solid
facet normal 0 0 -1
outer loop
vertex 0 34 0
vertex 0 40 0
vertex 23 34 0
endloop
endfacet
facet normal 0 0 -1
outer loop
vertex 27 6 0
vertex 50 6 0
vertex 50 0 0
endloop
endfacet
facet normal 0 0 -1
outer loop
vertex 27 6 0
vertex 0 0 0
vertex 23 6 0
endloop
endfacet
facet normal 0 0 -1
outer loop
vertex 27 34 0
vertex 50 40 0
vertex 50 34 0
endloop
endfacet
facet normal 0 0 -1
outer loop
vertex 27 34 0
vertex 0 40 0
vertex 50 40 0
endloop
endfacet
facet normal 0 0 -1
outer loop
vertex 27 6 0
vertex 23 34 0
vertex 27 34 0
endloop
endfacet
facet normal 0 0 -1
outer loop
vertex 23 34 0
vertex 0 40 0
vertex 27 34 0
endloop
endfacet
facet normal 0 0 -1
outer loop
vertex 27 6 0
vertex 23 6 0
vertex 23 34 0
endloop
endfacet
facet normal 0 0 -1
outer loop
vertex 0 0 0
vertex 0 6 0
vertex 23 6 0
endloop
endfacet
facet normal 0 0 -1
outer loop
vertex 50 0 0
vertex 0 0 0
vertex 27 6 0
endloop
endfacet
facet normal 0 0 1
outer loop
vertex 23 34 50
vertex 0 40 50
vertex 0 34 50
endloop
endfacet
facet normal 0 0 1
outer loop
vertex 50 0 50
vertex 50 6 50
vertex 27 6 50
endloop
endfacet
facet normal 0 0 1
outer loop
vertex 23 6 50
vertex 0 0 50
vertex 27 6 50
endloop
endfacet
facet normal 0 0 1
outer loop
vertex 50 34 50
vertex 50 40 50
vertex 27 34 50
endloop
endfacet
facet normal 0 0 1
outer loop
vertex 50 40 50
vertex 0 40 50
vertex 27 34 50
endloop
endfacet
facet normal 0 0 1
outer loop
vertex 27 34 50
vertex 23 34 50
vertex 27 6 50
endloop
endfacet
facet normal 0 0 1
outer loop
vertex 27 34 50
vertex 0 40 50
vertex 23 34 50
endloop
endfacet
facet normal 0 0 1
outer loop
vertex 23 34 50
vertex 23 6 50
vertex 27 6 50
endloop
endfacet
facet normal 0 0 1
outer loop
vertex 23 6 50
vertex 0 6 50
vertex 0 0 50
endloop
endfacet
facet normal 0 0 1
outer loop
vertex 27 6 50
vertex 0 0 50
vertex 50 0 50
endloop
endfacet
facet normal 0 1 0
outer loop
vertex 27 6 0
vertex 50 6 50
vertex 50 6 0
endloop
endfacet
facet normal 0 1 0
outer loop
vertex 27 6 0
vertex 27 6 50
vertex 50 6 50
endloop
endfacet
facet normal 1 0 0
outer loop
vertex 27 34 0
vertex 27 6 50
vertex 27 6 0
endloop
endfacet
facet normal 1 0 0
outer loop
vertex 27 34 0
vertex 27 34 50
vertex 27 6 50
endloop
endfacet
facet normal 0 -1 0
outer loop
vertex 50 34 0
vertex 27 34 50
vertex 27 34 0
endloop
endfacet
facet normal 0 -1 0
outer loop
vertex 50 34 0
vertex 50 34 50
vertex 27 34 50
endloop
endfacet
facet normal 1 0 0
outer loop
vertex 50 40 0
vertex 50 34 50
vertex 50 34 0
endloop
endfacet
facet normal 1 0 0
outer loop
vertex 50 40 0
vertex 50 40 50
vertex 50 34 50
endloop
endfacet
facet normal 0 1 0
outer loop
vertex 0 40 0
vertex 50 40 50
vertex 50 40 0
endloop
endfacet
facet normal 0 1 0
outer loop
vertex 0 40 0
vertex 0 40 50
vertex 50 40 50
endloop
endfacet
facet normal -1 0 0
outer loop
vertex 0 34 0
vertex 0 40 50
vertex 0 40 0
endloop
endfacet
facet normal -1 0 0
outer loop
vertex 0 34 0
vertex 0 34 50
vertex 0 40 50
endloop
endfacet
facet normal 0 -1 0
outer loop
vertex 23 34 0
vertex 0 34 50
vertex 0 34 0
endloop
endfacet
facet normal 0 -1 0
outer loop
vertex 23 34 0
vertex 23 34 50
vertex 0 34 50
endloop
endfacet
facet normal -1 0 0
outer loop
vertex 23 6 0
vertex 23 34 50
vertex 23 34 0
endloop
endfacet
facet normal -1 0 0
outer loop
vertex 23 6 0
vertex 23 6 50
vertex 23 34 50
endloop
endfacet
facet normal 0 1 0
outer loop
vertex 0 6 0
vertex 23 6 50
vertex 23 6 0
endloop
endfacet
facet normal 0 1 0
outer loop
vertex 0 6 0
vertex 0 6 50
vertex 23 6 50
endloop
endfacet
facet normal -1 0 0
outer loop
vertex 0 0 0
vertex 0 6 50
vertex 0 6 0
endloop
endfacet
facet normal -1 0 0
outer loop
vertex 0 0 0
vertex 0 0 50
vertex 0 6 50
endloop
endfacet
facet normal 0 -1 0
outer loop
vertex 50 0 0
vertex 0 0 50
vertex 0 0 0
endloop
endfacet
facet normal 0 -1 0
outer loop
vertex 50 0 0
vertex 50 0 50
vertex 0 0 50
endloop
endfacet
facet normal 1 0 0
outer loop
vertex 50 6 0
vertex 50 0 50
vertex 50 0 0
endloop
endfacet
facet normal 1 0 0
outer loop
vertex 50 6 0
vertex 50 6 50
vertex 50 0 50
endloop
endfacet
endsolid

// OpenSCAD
$fn = 32;

// ----------------------------------------------------------------------
// Structural section: ibeam 50 x 40 mm
// ----------------------------------------------------------------------

// --- parameters (mm) ---
sec_w = 50;               // section width, X
sec_h = 40;               // section height, Y
flange_t = 6;             // flange thickness
web_t = 4;                // web thickness
plate_t = 50;             // cut length, Z (extrusion height)

profile = [[0, 0], [50, 0], [50, 6], [27, 6], [27, 34], [50, 34], [50, 40], [0, 40], [0, 34], [23, 34], [23, 6], [0, 6]];  // primary outline, 12 points, counter clockwise

// --- the one profile operation ---
linear_extrude(height = plate_t) polygon(points = profile);
